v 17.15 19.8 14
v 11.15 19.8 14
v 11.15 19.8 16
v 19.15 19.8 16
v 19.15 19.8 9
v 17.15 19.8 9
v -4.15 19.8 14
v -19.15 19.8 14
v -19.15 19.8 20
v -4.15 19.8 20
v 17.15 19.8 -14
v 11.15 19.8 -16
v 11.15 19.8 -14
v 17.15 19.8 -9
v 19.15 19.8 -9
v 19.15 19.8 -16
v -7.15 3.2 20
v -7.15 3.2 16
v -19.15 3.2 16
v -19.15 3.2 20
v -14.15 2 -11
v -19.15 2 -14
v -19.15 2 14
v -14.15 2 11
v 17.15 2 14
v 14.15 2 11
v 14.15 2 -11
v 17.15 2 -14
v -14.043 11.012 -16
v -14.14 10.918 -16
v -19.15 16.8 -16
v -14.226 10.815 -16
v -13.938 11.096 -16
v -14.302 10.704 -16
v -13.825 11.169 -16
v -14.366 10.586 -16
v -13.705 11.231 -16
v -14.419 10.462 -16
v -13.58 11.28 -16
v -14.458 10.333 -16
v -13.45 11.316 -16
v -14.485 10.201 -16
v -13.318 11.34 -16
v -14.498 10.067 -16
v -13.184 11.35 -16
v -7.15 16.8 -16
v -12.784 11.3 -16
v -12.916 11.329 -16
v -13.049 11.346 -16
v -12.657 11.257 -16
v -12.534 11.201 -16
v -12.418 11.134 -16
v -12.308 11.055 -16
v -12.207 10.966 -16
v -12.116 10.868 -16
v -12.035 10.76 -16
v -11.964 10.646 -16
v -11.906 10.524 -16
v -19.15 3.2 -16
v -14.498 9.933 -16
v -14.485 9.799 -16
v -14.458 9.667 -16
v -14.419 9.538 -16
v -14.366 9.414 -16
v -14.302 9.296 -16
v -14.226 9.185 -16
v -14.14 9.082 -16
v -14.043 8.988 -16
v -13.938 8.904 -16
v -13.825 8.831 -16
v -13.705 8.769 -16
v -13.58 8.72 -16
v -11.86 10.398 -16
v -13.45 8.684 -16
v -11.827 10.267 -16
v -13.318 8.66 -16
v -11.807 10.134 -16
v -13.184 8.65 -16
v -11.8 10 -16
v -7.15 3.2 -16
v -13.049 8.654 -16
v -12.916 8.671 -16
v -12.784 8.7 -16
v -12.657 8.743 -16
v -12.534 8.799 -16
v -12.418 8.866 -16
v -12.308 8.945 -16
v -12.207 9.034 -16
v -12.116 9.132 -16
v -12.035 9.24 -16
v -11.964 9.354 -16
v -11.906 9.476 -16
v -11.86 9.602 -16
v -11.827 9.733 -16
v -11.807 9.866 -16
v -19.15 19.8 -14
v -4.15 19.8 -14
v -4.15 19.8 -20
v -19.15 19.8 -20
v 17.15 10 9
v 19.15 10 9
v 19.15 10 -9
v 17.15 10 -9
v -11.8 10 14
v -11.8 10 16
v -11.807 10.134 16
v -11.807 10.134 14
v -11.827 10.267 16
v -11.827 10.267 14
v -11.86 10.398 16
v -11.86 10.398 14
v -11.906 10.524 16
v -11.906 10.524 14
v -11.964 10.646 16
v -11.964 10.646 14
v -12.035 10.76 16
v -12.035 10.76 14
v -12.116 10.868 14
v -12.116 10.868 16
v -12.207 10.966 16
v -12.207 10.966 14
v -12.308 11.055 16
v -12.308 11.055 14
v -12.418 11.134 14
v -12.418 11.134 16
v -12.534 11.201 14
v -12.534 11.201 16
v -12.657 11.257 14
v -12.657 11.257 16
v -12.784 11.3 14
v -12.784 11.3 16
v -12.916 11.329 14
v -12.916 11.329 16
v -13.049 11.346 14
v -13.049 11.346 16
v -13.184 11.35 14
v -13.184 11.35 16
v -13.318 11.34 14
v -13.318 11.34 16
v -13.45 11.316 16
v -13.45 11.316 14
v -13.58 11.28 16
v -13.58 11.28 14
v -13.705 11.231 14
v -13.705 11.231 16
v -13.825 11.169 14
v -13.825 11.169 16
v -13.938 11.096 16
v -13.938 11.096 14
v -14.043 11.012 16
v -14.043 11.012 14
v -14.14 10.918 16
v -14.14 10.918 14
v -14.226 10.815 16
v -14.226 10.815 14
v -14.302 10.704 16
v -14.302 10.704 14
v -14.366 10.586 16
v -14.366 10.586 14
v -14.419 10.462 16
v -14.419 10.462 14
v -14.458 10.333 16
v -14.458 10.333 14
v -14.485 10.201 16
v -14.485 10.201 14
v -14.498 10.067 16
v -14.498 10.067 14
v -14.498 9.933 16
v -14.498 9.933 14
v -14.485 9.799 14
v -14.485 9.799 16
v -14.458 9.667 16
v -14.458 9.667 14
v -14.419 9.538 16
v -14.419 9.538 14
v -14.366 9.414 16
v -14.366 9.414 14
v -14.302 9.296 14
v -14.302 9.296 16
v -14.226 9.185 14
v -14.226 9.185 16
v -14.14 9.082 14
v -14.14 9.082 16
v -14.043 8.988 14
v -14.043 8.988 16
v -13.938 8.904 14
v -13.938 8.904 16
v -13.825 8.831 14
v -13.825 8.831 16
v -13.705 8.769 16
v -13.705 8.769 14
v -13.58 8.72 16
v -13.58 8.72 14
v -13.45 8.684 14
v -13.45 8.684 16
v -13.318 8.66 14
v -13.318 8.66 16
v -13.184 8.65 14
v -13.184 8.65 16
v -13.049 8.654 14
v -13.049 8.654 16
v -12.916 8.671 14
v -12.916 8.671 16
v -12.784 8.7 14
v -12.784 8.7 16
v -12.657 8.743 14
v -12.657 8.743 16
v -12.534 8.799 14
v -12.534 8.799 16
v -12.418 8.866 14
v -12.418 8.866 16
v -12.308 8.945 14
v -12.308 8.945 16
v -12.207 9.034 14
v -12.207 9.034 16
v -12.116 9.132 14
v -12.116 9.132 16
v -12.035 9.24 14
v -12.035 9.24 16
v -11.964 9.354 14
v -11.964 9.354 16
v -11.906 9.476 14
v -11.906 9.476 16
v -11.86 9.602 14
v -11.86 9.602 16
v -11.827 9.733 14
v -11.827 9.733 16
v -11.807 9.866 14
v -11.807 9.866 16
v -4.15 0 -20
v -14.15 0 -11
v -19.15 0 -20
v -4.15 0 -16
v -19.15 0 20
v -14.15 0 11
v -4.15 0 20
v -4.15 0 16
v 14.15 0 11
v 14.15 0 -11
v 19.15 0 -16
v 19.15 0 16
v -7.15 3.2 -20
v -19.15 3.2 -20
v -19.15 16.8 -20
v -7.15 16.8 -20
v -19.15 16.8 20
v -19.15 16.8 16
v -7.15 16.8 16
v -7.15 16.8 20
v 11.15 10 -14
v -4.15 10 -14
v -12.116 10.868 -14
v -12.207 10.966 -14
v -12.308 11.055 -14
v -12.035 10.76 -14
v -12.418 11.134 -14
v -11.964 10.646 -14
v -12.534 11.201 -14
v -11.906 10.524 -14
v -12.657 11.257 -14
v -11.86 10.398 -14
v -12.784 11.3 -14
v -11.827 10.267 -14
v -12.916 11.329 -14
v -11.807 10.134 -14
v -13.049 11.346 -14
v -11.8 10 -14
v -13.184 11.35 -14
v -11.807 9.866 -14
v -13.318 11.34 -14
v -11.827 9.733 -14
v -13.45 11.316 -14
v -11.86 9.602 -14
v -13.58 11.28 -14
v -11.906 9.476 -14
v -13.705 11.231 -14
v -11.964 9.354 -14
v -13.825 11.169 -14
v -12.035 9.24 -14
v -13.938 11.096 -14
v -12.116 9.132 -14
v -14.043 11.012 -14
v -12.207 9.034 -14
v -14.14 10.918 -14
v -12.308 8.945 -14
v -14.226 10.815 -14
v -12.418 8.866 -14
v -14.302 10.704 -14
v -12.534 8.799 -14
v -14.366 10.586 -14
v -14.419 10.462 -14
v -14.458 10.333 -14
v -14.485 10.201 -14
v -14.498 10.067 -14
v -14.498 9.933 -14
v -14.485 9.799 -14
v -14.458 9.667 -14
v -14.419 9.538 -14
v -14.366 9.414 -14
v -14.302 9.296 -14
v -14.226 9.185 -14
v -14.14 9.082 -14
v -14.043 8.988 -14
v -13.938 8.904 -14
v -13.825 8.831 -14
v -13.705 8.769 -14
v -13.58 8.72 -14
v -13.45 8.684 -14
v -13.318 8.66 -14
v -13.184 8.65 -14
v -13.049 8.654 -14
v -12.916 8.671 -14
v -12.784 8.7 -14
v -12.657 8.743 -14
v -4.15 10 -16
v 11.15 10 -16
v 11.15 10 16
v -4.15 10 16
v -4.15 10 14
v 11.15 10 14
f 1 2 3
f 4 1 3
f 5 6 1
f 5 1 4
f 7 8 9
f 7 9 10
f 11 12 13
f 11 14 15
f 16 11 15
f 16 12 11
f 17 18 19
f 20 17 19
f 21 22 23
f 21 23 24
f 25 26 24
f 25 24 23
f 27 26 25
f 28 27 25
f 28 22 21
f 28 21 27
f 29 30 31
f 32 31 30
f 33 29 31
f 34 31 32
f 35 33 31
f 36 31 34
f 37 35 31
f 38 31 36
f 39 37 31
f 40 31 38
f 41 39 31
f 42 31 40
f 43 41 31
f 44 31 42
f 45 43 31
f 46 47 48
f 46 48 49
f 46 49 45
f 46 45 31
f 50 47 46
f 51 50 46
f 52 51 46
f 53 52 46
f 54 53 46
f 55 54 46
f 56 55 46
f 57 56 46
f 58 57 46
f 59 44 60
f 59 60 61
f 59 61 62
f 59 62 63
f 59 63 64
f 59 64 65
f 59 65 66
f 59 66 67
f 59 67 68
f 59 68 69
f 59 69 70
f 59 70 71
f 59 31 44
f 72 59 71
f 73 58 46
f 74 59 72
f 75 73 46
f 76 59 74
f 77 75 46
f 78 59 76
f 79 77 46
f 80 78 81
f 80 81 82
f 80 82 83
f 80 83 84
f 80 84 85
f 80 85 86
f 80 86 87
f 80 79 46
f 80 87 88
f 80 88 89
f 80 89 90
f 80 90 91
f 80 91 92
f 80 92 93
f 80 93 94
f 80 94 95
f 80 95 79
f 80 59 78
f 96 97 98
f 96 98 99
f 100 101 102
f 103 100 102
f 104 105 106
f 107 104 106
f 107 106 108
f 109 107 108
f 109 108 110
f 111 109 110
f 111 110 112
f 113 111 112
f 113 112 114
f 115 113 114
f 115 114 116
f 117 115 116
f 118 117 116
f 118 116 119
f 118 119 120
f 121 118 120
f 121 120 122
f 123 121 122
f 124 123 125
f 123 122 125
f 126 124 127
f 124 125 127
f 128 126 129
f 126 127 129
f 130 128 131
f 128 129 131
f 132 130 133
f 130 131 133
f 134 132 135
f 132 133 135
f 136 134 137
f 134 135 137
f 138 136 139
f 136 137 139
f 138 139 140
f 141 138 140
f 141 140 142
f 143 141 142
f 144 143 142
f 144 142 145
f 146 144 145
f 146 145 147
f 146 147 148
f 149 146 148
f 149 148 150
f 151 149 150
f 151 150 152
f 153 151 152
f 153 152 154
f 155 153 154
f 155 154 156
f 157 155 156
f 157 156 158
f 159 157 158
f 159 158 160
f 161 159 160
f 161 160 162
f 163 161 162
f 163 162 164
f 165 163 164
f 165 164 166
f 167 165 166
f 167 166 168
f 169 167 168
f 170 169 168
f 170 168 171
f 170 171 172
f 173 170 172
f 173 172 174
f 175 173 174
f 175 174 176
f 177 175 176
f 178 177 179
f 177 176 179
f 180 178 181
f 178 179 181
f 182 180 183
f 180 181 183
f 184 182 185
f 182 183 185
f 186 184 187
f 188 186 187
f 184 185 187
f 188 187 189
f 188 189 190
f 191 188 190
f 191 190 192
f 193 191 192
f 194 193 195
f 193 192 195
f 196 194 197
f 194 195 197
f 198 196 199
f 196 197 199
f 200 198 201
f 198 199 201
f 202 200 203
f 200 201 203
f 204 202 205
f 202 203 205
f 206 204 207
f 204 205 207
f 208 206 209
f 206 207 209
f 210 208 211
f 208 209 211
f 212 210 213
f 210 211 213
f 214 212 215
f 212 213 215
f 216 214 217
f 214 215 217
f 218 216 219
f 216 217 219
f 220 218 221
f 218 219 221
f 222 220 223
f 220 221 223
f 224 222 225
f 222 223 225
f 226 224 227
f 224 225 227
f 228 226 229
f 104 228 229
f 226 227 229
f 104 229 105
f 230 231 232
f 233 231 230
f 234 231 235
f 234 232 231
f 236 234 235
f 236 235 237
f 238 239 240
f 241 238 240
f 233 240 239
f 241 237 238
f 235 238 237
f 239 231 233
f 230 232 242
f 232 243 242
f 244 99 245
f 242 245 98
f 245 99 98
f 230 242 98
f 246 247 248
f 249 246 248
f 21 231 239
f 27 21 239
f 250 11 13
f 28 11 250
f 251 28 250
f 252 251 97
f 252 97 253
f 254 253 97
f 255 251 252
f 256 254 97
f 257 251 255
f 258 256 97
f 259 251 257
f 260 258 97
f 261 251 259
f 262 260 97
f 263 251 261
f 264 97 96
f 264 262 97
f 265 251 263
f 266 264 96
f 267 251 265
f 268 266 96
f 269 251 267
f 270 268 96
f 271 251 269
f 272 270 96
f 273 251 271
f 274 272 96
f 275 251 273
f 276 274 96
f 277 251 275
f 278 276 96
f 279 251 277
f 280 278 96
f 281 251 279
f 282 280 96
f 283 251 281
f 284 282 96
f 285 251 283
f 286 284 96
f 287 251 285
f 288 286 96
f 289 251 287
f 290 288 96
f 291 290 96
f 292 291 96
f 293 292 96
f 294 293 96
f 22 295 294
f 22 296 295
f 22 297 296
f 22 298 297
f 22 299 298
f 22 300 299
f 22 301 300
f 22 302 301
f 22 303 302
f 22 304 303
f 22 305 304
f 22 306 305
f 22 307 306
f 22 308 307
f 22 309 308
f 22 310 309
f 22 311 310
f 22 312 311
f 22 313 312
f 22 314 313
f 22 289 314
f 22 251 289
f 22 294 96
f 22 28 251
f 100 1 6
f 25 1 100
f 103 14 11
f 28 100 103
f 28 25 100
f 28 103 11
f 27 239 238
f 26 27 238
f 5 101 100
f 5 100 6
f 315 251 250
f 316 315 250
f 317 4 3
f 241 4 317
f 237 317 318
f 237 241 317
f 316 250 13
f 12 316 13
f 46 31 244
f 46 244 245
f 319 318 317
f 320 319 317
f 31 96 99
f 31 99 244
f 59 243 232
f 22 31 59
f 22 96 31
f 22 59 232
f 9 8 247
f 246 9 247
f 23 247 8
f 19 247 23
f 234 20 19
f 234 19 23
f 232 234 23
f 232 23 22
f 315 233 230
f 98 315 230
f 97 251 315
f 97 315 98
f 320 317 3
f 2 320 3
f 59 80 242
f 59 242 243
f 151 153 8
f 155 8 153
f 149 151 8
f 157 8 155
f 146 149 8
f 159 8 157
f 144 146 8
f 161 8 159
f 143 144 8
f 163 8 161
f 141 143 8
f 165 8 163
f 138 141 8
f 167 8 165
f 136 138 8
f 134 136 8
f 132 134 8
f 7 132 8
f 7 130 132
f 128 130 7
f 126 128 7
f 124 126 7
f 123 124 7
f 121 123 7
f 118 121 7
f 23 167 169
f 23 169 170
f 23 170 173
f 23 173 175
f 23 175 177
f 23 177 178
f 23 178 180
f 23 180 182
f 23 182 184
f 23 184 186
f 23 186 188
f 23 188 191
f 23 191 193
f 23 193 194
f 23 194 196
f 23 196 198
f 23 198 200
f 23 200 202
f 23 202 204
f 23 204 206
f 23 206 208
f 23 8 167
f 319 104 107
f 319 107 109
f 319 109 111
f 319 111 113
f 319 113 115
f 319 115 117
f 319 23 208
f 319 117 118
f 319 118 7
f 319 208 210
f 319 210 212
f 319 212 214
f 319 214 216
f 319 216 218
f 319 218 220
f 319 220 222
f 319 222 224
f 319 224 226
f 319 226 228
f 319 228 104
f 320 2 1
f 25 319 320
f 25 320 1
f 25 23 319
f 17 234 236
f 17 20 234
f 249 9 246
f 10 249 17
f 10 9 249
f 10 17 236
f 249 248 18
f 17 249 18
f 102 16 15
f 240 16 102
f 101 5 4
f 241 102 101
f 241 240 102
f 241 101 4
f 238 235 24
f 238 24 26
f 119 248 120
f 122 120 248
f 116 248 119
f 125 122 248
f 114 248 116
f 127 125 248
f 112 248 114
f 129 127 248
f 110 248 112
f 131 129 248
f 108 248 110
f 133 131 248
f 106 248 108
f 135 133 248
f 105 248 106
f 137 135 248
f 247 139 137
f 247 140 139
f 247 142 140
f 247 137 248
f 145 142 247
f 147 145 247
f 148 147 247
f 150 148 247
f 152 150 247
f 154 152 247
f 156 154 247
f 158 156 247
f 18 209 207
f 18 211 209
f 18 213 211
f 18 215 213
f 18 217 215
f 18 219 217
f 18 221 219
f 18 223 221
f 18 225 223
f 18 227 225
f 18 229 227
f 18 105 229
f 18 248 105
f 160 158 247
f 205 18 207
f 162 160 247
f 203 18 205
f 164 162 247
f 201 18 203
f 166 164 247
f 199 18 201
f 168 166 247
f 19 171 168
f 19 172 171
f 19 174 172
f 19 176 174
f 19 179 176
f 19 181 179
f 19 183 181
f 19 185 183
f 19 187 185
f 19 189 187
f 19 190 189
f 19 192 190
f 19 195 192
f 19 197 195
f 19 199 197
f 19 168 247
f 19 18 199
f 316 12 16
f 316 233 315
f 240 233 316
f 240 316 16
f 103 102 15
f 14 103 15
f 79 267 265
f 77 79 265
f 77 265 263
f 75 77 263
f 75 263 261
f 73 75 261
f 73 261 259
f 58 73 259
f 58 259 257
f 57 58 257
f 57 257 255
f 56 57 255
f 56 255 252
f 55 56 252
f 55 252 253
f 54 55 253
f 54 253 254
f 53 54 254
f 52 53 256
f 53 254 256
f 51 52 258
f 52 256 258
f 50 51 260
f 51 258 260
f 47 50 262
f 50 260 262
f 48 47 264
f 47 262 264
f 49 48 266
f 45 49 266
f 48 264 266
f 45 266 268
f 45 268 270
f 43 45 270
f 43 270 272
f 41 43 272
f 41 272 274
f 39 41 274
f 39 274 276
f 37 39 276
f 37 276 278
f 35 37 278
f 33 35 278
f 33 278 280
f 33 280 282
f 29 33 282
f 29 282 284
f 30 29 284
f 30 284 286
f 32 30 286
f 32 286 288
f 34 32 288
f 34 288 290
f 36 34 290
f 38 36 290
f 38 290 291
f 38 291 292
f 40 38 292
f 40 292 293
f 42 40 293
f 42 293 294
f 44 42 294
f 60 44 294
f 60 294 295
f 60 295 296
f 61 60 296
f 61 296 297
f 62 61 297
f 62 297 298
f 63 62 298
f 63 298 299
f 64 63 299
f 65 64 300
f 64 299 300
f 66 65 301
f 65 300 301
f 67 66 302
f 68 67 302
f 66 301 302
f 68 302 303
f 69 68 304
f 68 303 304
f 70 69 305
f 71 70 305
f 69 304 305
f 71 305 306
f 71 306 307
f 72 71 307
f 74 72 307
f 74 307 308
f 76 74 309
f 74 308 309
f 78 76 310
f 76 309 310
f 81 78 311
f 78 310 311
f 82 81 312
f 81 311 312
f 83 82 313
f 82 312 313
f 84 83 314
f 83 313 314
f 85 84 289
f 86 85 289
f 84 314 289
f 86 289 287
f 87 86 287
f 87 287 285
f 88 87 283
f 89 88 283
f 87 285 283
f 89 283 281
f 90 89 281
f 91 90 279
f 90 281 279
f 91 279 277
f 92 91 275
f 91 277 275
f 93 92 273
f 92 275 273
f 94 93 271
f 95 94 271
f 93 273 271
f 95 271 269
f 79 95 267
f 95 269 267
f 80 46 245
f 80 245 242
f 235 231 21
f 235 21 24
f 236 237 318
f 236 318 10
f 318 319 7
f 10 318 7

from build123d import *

# Parameters (mm, degrees)
SKETCH_1_W           = 38.3
SKETCH_1_H           = 32
EXTRUDE_1_DEPTH      = 2
EXTRUDE_2_DEPTH      = 75
SKETCH_9_R           = 1.35
CUT_EXTRUDE_5_DEPTH  = 33
SKETCH_10_W          = 15.3
SKETCH_10_H          = 52
CUT_EXTRUDE_6_DEPTH  = 33
SKETCH_11_W          = 28.3
SKETCH_11_H          = 22
CUT_EXTRUDE_7_DEPTH  = 78
SKETCH_13_W          = 18
SKETCH_13_H          = 57
CUT_EXTRUDE_8_DEPTH  = 39.3
SKETCH_14_W          = 5
SKETCH_14_H          = 2
CUT_EXTRUDE_9_DEPTH  = 33
EXTRUDE_3_DEPTH      = 4
SKETCH_17_W          = 38.3
SKETCH_17_H          = 32
CUT_EXTRUDE_10_DEPTH = 57.2


with BuildPart() as part:
    # Эскиз1 → Бобышка-Вытянуть1 (new body)
    with BuildSketch(Plane(origin=(0, 0, 0), x_dir=(1, 0, 0), z_dir=(0, 1, 0))):
        Rectangle(SKETCH_1_W, SKETCH_1_H)
    extrude(amount=EXTRUDE_1_DEPTH)

    # Эскиз2 → Бобышка-Вытянуть2 (add)
    with BuildSketch(Plane(origin=(0, 2, 0), x_dir=(1, 0, 0), z_dir=(0, 1, 0))):
        Polygon((-19.15, 16), (19.15, 16), (19.15, -16), (-19.15, -16), (-19.15, -14), (17.15, -14), (17.15, 14), (-19.15, 14), align=None)
    extrude(amount=EXTRUDE_2_DEPTH)

    # Эскиз9 → Вырез-Вытянуть5 (cut, through all)
    with BuildSketch(Plane.XY.offset(16)):
        with Locations((-13.15, 69)):
            Circle(SKETCH_9_R)
        with Locations((-13.15, 10)):
            Circle(SKETCH_9_R)
    extrude(amount=-CUT_EXTRUDE_5_DEPTH, mode=Mode.SUBTRACT)

    # Эскиз10 → Вырез-Вытянуть6 (cut, through all)
    with BuildSketch(Plane.XY.offset(16)):
        with Locations((3.5, 36)):
            Rectangle(SKETCH_10_W, SKETCH_10_H)
    extrude(amount=-CUT_EXTRUDE_6_DEPTH, mode=Mode.SUBTRACT)

    # Эскиз11 → Вырез-Вытянуть7 (cut, through all)
    with BuildSketch(Plane.XZ):
        Rectangle(SKETCH_11_W, SKETCH_11_H)
    extrude(amount=-CUT_EXTRUDE_7_DEPTH, mode=Mode.SUBTRACT)

    # Эскиз13 → Вырез-Вытянуть8 (cut, through all)
    with BuildSketch(Plane(origin=(19.15, 0, 0), x_dir=(0, 0, -1), z_dir=(1, 0, 0))):
        with Locations((0, 38.5)):
            Rectangle(SKETCH_13_W, SKETCH_13_H)
    extrude(amount=-CUT_EXTRUDE_8_DEPTH, mode=Mode.SUBTRACT)

    # Эскиз14 → Вырез-Вытянуть9 (cut, through all)
    with BuildSketch(Plane(origin=(0, 0, -16), x_dir=(-1, 0, 0), z_dir=(0, 0, -1))):
        with Locations((-11.65, 71)):
            Rectangle(SKETCH_14_W, SKETCH_14_H)
        with Locations((1.65, 71)):
            Rectangle(SKETCH_14_W, SKETCH_14_H)
    extrude(amount=-CUT_EXTRUDE_9_DEPTH, mode=Mode.SUBTRACT)

    # Эскиз16 → Бобышка-Вытянуть3 (add)
    with BuildSketch(Plane.XY.offset(16)):
        Polygon((-19.15, 0), (-4.15, 0), (-4.15, 19.8), (-19.15, 19.8), (-19.15, 16.8), (-7.15, 16.8), (-7.15, 3.2), (-19.15, 3.2), align=None)
    extrude_3 = extrude(amount=EXTRUDE_3_DEPTH)

    # Зеркальное отражение1: Бобышка-Вытянуть3 across plane
    add(extrude_3.mirror(Plane.XY))

    # Эскиз17 → Вырез-Вытянуть10 (cut)
    with BuildSketch(Plane(origin=(0, 77, 0), x_dir=(1, 0, 0), z_dir=(0, 1, 0))):
        Rectangle(SKETCH_17_W, SKETCH_17_H)
    extrude(amount=-CUT_EXTRUDE_10_DEPTH, mode=Mode.SUBTRACT)


solid = part.part
